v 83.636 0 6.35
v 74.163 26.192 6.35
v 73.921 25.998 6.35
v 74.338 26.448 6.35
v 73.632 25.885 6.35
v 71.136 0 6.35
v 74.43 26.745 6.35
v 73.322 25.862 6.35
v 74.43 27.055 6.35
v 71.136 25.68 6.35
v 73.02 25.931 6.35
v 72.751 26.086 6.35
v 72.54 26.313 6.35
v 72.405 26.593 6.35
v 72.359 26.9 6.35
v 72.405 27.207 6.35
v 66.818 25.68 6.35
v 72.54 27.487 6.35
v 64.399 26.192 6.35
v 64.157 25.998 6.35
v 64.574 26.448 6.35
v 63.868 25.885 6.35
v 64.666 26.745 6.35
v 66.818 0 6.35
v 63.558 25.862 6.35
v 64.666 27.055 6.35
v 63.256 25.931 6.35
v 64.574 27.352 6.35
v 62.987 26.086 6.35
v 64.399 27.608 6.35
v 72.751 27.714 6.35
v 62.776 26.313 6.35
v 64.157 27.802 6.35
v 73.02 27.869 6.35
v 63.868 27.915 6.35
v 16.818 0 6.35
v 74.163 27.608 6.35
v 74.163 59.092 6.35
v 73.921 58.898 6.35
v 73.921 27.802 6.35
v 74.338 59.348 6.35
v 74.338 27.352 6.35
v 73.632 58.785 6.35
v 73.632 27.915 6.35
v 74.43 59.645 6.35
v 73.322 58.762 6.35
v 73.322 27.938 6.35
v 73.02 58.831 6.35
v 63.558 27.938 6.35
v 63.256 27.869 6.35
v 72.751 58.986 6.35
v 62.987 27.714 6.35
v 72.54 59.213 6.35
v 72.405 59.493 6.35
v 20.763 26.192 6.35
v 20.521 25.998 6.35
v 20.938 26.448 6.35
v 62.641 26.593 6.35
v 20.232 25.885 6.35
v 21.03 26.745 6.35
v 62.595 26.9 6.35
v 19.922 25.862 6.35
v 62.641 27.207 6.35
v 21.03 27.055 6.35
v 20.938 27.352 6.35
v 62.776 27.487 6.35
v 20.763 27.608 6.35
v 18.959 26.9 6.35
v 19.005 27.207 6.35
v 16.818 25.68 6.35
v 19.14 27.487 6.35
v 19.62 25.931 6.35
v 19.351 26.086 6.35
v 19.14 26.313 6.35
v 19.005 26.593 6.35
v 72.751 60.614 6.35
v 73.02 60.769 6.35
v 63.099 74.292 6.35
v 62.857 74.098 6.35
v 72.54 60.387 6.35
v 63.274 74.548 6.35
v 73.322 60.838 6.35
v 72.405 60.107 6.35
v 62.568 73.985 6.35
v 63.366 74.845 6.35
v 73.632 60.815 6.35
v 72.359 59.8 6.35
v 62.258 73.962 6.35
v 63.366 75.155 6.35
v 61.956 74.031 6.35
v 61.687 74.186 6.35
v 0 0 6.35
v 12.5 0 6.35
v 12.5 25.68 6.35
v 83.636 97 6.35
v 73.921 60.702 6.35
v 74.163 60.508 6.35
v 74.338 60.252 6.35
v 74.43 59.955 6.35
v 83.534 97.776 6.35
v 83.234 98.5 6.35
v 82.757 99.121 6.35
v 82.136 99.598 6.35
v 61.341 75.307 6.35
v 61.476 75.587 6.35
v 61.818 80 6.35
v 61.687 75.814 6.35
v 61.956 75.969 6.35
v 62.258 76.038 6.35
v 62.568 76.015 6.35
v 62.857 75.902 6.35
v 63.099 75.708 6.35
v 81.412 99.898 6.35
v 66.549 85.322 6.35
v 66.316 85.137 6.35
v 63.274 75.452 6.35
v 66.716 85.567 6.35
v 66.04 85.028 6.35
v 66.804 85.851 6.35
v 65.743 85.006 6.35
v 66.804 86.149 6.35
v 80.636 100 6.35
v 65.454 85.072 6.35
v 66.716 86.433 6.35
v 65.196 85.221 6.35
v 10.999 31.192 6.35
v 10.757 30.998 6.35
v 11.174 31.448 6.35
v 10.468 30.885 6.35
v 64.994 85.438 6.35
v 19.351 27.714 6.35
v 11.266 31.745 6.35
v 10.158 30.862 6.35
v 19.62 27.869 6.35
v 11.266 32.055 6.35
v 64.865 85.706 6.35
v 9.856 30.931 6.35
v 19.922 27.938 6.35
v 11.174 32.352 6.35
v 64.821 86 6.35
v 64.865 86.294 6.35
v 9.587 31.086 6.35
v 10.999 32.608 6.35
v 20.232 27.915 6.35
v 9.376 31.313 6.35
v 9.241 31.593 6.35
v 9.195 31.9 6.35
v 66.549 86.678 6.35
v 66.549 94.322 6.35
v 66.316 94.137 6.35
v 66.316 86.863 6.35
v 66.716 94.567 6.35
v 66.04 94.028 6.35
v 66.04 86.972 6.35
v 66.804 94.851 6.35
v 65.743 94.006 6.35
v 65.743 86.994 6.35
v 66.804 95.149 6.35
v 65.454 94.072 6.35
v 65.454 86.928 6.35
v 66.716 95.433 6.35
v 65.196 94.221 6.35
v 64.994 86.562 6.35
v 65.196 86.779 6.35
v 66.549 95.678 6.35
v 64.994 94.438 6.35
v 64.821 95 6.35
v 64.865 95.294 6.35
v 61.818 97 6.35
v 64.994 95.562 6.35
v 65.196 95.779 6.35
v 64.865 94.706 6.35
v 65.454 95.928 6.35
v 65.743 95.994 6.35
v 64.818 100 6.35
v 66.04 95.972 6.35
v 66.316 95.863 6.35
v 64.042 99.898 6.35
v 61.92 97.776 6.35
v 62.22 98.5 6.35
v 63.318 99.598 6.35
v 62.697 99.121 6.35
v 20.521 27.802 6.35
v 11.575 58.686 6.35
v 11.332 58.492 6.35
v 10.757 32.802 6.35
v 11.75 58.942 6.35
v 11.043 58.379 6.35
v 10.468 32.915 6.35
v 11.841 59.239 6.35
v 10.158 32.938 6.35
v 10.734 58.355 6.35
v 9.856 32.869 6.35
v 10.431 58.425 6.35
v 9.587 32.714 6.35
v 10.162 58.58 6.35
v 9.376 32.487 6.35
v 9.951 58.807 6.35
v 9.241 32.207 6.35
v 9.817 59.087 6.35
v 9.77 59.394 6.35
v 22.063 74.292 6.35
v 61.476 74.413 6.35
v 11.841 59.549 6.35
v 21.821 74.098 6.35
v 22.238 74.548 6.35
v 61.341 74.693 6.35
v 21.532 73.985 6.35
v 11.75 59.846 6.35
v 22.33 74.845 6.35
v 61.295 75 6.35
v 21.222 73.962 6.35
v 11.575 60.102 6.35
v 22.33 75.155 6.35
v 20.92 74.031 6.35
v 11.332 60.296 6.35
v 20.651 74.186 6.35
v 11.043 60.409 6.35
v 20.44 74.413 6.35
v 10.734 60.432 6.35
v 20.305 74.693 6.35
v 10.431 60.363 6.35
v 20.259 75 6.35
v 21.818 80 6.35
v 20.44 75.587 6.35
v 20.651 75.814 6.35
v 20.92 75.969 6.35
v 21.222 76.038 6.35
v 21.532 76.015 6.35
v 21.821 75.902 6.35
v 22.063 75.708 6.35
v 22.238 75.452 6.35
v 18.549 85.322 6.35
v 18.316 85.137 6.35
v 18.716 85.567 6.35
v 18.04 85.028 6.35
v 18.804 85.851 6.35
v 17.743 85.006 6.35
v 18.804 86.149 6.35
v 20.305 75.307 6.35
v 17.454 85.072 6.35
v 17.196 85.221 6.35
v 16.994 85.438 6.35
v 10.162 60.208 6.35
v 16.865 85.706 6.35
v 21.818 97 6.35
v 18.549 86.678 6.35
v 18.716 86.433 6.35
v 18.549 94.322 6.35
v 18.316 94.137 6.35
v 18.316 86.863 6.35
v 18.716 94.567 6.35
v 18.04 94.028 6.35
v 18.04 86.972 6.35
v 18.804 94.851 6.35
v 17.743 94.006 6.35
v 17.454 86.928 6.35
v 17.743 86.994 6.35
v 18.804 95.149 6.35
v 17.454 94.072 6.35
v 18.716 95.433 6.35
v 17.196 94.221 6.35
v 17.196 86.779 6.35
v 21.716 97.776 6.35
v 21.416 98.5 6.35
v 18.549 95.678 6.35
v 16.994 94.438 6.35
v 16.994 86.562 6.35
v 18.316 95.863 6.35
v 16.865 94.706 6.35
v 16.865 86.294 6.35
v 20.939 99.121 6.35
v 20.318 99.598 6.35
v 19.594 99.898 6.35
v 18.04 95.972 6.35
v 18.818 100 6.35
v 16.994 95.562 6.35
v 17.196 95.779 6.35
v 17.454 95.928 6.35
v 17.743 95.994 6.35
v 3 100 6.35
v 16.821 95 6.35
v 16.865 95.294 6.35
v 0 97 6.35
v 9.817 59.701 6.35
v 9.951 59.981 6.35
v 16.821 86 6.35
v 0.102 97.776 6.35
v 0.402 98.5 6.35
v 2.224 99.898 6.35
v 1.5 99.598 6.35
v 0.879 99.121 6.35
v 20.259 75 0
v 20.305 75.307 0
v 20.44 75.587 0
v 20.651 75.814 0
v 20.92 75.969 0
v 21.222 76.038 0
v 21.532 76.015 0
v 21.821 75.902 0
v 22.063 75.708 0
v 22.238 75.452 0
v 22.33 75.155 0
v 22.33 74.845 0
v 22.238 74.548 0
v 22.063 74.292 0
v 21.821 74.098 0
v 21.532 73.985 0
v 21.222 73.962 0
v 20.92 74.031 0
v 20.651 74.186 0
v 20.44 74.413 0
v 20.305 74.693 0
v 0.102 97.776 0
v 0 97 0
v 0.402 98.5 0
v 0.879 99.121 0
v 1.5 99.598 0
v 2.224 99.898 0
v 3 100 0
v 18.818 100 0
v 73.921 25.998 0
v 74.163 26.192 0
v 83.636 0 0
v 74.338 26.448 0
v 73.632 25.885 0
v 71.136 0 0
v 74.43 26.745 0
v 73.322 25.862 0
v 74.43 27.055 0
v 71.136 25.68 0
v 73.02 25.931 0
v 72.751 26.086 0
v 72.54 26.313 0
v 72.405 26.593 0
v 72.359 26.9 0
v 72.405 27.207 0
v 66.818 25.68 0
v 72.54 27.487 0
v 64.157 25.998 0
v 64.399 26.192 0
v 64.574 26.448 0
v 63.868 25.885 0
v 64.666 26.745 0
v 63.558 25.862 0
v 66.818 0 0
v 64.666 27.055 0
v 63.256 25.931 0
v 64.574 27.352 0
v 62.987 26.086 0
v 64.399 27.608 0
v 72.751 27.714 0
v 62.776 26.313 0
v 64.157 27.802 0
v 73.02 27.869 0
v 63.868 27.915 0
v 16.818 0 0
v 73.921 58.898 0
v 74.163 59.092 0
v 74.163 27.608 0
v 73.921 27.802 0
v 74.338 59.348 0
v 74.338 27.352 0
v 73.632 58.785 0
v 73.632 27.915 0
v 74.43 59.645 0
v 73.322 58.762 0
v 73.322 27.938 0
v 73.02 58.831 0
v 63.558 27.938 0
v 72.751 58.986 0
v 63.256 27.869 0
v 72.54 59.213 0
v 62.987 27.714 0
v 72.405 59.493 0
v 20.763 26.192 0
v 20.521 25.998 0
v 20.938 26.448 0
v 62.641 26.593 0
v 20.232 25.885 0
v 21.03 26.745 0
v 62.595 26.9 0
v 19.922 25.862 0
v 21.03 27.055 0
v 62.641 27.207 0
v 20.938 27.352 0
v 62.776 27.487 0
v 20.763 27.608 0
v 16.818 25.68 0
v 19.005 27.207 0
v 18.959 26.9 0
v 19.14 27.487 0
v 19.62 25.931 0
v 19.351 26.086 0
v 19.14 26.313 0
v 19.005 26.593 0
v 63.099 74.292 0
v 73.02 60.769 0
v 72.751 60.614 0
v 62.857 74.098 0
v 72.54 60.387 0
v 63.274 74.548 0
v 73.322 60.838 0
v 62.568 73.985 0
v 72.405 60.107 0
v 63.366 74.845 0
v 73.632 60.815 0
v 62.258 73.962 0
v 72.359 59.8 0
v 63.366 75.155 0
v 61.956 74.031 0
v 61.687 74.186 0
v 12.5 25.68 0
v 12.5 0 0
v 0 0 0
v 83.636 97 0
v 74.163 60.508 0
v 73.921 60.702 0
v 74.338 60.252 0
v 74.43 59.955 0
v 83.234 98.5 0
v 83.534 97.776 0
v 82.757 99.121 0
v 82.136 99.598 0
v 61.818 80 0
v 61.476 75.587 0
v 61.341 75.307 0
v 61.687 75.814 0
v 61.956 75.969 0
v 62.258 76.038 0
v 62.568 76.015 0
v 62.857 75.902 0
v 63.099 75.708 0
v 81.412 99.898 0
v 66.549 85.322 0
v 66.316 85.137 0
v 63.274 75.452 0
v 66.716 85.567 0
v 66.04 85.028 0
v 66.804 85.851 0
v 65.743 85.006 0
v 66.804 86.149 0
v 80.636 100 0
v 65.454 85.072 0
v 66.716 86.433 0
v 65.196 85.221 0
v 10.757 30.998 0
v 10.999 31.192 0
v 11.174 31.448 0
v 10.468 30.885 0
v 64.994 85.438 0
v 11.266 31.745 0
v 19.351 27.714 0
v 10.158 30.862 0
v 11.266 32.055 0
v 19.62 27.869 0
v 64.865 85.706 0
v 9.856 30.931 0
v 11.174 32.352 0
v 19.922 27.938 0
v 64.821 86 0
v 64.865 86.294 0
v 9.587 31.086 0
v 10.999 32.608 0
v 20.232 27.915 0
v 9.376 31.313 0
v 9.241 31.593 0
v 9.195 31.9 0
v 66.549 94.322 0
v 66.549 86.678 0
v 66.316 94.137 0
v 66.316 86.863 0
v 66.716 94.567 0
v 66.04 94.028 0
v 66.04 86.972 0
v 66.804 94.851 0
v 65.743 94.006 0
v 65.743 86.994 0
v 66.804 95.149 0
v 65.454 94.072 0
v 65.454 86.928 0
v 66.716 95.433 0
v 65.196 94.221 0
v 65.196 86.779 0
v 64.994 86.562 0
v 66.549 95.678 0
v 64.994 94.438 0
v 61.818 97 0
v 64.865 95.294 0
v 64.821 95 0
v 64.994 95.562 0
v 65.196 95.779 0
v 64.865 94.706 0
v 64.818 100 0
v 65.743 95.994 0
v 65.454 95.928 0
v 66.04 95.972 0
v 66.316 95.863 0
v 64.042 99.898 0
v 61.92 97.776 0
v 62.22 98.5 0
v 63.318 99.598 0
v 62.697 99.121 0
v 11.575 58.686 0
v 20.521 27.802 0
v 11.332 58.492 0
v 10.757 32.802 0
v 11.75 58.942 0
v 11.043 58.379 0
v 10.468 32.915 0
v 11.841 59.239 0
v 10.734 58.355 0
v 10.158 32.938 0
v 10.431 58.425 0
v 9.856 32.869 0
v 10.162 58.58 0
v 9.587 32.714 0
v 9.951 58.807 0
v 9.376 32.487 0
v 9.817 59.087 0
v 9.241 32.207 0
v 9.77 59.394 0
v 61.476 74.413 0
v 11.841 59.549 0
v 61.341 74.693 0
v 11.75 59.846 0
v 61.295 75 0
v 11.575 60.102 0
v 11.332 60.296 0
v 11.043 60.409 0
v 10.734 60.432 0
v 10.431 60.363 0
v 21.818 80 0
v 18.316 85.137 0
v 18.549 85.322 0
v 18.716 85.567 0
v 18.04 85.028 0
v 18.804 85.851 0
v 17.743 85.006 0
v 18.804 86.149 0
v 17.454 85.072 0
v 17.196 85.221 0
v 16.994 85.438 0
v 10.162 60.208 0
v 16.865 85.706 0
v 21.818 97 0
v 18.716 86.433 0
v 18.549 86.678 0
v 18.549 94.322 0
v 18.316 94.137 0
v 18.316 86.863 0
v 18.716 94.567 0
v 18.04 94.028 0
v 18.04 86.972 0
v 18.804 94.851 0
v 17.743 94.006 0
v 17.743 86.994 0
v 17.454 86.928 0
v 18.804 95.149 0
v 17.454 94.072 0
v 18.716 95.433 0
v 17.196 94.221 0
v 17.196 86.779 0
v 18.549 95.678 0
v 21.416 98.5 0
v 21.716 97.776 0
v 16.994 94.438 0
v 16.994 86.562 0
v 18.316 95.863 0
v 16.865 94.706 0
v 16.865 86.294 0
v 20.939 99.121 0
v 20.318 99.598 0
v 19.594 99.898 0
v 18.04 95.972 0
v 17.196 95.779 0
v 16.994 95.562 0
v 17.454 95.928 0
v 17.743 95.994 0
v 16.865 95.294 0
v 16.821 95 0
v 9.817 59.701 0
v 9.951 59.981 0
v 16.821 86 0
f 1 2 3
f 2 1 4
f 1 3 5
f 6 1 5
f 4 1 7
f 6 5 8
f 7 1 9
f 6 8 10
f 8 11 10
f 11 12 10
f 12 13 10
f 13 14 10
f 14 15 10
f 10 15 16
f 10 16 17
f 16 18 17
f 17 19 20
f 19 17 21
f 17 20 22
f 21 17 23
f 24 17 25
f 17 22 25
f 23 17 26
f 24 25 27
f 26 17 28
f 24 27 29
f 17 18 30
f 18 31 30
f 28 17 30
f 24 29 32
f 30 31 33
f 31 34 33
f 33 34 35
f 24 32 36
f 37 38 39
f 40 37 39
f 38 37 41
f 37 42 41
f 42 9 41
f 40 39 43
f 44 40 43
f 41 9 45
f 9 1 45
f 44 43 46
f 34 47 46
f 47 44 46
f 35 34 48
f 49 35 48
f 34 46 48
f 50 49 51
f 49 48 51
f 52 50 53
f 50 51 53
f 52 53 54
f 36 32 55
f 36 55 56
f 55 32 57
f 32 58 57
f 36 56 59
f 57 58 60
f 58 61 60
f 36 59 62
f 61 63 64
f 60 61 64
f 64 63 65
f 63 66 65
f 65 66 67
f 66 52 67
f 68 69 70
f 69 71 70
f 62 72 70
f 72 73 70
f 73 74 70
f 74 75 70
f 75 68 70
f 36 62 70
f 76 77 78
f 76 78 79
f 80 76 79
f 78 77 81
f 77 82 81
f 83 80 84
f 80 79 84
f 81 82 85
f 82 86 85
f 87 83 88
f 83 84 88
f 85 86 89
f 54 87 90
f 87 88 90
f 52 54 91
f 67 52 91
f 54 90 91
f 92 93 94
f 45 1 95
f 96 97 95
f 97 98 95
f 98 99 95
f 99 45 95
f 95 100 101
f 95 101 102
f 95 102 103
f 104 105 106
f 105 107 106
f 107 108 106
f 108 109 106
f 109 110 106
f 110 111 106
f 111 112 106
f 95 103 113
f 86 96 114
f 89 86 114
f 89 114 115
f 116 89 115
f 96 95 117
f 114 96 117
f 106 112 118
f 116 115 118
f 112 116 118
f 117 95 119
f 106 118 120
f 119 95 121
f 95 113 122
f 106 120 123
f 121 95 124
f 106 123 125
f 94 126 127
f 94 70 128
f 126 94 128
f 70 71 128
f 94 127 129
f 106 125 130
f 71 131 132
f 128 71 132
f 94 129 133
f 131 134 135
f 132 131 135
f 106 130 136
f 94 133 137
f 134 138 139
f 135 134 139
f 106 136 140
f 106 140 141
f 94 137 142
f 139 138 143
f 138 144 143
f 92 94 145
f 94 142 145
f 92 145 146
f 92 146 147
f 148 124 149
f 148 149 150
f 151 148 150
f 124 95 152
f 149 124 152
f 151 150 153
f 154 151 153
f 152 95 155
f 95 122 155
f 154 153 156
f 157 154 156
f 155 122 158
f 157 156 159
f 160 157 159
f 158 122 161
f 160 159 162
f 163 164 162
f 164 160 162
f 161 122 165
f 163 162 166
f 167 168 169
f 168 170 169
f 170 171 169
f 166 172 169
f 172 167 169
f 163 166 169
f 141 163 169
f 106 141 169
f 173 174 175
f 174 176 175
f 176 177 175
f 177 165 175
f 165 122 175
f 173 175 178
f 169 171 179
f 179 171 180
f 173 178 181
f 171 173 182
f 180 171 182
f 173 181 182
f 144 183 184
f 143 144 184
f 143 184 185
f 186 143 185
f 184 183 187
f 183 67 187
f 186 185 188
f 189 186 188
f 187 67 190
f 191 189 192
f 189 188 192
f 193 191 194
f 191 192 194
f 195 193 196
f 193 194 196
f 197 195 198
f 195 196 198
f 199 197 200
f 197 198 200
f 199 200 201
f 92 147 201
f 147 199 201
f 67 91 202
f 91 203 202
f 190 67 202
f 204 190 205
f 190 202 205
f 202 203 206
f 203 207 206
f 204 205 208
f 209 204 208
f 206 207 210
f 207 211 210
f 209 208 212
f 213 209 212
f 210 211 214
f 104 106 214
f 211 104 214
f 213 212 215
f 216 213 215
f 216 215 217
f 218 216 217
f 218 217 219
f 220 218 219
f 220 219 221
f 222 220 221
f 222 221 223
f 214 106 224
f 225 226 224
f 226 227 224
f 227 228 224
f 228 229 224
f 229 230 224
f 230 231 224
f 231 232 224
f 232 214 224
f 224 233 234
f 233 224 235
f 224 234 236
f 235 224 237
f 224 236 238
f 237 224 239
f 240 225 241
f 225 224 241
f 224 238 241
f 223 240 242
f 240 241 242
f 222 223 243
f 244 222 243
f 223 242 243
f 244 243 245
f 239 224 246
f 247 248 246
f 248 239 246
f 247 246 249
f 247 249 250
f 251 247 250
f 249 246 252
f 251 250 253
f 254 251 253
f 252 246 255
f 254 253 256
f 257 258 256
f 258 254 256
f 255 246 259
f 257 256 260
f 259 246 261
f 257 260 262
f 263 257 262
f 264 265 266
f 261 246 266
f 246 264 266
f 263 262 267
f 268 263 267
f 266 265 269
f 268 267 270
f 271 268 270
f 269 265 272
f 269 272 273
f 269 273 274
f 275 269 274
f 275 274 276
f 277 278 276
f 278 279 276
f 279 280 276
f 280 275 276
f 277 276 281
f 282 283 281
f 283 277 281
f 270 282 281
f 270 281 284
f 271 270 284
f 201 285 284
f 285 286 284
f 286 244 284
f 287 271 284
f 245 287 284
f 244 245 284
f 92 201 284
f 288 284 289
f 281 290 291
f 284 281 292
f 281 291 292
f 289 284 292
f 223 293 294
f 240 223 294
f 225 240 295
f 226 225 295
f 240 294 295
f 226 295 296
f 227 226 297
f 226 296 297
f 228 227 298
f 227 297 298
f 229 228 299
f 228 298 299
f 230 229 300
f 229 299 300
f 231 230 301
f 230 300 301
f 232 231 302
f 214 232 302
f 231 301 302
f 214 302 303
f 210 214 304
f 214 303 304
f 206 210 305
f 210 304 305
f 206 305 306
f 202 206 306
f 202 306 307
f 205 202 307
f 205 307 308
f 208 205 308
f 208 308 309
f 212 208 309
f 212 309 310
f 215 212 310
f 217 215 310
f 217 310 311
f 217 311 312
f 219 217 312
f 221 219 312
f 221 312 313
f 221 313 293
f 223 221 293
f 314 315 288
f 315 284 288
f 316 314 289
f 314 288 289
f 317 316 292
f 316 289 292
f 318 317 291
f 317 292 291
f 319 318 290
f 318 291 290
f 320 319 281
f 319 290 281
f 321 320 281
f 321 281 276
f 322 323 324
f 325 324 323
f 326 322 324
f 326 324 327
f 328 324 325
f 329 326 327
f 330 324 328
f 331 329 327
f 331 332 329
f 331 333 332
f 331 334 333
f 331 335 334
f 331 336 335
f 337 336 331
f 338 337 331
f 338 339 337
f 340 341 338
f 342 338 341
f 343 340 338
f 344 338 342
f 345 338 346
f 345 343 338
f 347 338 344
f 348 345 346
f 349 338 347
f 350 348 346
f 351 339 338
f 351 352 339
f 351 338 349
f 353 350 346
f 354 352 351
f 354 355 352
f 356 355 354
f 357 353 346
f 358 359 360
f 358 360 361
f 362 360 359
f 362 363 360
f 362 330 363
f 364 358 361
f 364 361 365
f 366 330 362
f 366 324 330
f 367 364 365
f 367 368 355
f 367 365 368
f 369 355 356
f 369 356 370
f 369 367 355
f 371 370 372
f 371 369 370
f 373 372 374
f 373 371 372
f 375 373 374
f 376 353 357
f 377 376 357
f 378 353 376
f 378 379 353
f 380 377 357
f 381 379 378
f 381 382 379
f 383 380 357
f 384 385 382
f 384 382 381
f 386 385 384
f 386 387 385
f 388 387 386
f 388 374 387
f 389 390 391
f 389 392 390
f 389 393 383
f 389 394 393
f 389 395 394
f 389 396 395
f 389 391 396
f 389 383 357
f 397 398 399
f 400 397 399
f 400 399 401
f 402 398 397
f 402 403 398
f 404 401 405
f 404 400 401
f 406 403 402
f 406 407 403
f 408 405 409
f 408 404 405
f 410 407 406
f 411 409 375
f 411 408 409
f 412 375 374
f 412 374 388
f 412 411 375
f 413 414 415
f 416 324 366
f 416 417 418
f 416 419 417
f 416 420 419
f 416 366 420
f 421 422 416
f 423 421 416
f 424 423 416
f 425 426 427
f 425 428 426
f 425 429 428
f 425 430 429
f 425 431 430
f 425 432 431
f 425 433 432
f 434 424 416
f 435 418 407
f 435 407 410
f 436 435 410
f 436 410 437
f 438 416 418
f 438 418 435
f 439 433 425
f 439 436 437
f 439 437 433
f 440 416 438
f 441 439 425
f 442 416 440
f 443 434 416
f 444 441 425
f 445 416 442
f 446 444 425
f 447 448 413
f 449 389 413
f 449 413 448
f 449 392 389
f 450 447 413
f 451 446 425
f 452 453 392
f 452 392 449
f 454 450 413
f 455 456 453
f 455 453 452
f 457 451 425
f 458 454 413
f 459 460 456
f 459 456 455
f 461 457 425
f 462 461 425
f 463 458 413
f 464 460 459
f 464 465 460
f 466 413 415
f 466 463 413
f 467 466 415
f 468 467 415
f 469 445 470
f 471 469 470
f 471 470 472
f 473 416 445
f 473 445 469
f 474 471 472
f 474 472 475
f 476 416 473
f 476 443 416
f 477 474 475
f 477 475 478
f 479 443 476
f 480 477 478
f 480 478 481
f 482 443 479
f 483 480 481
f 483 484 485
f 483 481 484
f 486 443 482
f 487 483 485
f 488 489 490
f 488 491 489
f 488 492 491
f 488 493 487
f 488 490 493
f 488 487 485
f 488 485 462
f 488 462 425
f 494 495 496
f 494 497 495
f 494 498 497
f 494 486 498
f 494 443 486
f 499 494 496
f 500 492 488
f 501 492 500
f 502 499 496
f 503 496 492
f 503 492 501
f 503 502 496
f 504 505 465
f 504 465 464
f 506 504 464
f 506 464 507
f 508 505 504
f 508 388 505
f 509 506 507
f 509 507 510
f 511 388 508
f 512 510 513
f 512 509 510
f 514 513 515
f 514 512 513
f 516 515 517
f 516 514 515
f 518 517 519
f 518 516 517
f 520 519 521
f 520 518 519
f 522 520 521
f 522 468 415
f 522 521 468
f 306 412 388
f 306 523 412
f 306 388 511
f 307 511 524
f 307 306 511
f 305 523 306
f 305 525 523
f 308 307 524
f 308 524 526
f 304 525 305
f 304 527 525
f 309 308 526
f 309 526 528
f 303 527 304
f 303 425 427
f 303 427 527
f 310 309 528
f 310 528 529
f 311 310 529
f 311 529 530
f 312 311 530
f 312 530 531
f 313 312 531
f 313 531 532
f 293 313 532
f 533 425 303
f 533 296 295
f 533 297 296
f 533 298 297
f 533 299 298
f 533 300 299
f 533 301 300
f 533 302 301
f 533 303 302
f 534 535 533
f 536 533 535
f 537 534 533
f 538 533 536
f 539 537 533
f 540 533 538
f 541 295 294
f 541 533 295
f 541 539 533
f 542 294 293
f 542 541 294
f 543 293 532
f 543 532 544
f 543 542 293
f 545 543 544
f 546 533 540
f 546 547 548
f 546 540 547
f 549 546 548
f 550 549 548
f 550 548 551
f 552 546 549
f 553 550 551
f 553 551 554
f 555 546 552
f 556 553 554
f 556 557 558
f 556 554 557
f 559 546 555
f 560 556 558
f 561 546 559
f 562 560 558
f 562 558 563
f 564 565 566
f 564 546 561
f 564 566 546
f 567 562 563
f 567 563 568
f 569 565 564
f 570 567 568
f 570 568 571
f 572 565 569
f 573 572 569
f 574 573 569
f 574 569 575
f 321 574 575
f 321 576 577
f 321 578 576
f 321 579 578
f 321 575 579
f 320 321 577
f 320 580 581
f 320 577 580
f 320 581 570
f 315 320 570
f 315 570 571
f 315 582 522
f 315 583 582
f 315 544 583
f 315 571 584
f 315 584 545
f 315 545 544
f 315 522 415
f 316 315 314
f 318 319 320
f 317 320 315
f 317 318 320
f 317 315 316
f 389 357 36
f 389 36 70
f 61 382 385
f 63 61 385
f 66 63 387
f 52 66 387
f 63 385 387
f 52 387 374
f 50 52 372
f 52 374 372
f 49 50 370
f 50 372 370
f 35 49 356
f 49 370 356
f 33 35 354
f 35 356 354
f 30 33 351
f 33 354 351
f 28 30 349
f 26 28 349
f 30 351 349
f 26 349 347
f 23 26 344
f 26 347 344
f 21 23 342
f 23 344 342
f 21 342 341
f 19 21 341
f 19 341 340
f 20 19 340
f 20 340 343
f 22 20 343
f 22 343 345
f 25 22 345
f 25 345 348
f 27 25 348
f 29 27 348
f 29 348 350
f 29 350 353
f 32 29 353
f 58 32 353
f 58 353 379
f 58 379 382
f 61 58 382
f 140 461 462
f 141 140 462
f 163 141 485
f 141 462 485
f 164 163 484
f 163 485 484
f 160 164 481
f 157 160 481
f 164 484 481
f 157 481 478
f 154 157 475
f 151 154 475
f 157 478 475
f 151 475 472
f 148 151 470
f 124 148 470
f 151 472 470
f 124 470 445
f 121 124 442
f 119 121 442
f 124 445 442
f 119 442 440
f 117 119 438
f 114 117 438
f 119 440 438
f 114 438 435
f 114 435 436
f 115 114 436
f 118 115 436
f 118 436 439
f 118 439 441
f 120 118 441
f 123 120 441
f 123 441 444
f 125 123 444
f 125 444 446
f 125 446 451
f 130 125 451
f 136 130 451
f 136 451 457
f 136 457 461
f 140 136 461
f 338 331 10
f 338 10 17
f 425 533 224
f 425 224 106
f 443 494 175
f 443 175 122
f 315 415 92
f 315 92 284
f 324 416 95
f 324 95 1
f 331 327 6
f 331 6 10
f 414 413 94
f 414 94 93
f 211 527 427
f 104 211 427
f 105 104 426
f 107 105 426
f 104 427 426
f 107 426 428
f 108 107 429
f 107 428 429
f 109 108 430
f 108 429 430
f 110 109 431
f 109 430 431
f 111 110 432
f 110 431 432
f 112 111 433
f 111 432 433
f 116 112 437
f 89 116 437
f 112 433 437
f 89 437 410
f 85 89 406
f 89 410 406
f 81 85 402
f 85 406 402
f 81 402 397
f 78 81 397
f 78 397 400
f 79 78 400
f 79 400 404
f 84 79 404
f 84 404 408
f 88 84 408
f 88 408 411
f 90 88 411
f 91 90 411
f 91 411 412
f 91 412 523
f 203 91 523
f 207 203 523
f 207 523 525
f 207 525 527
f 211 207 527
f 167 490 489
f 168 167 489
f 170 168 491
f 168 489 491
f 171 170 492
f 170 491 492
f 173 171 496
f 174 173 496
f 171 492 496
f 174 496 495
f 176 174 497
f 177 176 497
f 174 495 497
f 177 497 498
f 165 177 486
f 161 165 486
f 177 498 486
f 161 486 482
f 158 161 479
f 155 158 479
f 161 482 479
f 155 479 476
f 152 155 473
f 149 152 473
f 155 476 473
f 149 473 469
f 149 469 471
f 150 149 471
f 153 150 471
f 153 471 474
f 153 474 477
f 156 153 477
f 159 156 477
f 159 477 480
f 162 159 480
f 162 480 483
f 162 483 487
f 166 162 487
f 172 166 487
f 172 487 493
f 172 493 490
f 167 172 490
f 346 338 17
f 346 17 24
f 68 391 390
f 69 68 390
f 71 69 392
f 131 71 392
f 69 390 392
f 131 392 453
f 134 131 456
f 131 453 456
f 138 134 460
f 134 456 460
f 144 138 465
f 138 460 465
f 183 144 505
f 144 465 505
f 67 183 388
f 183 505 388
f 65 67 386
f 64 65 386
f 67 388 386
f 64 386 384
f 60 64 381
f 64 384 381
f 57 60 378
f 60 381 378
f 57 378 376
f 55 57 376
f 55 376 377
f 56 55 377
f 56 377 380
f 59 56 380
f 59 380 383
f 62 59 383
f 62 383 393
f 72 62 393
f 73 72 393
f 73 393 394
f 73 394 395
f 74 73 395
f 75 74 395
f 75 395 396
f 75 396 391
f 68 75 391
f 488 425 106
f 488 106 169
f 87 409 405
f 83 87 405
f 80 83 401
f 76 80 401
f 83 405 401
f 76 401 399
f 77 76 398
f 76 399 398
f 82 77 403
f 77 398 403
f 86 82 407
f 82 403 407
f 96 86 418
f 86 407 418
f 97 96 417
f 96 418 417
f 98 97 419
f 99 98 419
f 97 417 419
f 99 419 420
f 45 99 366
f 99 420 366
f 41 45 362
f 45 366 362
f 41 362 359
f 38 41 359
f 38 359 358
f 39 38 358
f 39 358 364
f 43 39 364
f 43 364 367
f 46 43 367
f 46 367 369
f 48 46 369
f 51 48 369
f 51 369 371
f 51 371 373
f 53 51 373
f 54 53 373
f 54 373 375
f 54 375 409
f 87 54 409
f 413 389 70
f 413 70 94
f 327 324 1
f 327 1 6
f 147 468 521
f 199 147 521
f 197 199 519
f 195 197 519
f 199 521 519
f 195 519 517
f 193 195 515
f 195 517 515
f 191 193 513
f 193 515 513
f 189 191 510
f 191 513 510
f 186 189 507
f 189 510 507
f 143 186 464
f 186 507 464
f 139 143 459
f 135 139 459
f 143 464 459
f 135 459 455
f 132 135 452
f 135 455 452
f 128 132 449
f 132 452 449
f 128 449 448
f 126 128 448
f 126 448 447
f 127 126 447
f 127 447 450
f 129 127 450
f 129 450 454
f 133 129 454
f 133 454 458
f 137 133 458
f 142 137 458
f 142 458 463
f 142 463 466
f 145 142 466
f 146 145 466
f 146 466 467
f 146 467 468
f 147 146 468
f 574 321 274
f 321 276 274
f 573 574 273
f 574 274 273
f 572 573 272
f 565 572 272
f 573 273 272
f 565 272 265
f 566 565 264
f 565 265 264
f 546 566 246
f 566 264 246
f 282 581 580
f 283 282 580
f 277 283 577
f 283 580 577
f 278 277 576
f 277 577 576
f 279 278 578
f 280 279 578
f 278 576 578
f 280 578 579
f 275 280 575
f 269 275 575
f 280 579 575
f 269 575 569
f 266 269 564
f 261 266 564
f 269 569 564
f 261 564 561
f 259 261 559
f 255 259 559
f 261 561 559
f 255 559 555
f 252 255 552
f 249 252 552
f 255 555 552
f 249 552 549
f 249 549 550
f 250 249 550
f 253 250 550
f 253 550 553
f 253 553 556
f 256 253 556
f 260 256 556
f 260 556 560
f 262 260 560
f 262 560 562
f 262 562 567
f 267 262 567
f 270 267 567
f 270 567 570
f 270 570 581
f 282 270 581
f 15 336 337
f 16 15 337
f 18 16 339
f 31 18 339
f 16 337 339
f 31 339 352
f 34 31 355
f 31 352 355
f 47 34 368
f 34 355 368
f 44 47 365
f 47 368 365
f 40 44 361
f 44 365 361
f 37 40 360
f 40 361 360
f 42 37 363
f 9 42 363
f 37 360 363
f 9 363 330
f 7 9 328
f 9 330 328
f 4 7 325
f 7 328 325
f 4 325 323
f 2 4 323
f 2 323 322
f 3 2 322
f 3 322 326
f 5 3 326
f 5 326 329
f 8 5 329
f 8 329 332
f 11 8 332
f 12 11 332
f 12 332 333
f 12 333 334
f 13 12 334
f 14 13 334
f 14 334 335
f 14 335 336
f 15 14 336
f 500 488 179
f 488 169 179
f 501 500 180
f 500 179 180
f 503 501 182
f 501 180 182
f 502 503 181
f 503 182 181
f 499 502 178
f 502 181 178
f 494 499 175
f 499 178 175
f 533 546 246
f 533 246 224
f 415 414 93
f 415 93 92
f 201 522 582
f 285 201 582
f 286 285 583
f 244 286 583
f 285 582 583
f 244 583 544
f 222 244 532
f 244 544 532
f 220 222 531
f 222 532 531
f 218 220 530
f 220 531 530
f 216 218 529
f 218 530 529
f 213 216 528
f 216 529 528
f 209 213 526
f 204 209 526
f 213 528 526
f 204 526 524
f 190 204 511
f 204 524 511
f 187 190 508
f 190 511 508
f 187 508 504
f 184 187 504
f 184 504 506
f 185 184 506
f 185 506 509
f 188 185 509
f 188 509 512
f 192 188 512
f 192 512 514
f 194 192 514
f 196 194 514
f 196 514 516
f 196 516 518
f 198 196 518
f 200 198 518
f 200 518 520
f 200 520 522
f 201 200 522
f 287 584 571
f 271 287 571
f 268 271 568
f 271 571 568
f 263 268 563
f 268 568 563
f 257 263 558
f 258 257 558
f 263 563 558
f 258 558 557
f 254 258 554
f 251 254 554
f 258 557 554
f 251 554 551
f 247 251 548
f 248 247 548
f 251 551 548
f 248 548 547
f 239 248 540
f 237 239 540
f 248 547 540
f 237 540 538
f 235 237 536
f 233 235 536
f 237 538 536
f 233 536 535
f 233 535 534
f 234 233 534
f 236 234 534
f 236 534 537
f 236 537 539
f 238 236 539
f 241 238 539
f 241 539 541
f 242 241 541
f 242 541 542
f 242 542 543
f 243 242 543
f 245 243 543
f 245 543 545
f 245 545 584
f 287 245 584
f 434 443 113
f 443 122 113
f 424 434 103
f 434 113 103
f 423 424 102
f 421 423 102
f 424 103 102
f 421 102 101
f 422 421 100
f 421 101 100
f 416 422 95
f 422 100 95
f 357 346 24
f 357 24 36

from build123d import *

# Parameters (mm, degrees)
MAIN_SHAPE_DEPTH                            = 6.35
FILLET1_R                                   = 3
F_3_48_TAPPED_HOLE1_D                       = 1.9939
F_3_48_TAPPED_HOLE1_DEPTH                   = 6.61
F_3_48_TAPPED_HOLE1_TIP                     = 0.599027994
F_3_48_TAPPED_HOLE1_FOR_ARDUINO_MOUNT_D     = 2.0828
F_3_48_TAPPED_HOLE1_FOR_ARDUINO_MOUNT_DEPTH = 7.3
F_3_48_TAPPED_HOLE1_FOR_ARDUINO_MOUNT_TIP   = 0.625736249


with BuildPart() as part:
    # Sketch1 → main shape (new body)
    with BuildSketch(Plane.XY):
        Polygon((0, 0), (0, 100), (21.818, 100), (21.818, 80), (61.818, 80), (61.818, 100), (83.636, 100), (83.636, 0), (71.136, 0), (71.136, 25.68), (66.818, 25.68), (66.818, 0), (16.818, 0), (16.818, 25.68), (12.5, 25.68), (12.5, 0), align=None)
    extrude(amount=MAIN_SHAPE_DEPTH)

    # Fillet1
    fillet1_edges = [part.edges().sort_by_distance(p)[0] for p in [
        (0, 100, 3.175),
        (21.818, 100, 3.175),
        (61.818, 100, 3.175),
        (83.636, 100, 3.175),
    ]]
    fillet(fillet1_edges, radius=FILLET1_R)

    # #3-48 Tapped Hole1
    with Locations(Plane.XY.offset(6.35)):
        with Locations((17.818, 95), (17.818, 86), (65.818, 86), (65.818, 95)):
            Hole(F_3_48_TAPPED_HOLE1_D / 2, depth=F_3_48_TAPPED_HOLE1_DEPTH)
            with Locations((0, 0, -(F_3_48_TAPPED_HOLE1_DEPTH + F_3_48_TAPPED_HOLE1_TIP / 2))):  # 118° drill point
                Cone(0, F_3_48_TAPPED_HOLE1_D / 2, F_3_48_TAPPED_HOLE1_TIP, mode=Mode.SUBTRACT)

    # #3-48 Tapped Hole1 for arduino mount
    with Locations(Plane.XY.offset(6.35)):
        with Locations((21.3, 75), (20, 26.9), (73.4, 26.9), (73.4, 59.8), (10.236, 31.9), (63.636, 26.9), (62.336, 75), (10.811692828, 59.393923536)):
            Hole(F_3_48_TAPPED_HOLE1_FOR_ARDUINO_MOUNT_D / 2, depth=F_3_48_TAPPED_HOLE1_FOR_ARDUINO_MOUNT_DEPTH)
            with Locations((0, 0, -(F_3_48_TAPPED_HOLE1_FOR_ARDUINO_MOUNT_DEPTH + F_3_48_TAPPED_HOLE1_FOR_ARDUINO_MOUNT_TIP / 2))):  # 118° drill point
                Cone(0, F_3_48_TAPPED_HOLE1_FOR_ARDUINO_MOUNT_D / 2, F_3_48_TAPPED_HOLE1_FOR_ARDUINO_MOUNT_TIP, mode=Mode.SUBTRACT)


solid = part.part
